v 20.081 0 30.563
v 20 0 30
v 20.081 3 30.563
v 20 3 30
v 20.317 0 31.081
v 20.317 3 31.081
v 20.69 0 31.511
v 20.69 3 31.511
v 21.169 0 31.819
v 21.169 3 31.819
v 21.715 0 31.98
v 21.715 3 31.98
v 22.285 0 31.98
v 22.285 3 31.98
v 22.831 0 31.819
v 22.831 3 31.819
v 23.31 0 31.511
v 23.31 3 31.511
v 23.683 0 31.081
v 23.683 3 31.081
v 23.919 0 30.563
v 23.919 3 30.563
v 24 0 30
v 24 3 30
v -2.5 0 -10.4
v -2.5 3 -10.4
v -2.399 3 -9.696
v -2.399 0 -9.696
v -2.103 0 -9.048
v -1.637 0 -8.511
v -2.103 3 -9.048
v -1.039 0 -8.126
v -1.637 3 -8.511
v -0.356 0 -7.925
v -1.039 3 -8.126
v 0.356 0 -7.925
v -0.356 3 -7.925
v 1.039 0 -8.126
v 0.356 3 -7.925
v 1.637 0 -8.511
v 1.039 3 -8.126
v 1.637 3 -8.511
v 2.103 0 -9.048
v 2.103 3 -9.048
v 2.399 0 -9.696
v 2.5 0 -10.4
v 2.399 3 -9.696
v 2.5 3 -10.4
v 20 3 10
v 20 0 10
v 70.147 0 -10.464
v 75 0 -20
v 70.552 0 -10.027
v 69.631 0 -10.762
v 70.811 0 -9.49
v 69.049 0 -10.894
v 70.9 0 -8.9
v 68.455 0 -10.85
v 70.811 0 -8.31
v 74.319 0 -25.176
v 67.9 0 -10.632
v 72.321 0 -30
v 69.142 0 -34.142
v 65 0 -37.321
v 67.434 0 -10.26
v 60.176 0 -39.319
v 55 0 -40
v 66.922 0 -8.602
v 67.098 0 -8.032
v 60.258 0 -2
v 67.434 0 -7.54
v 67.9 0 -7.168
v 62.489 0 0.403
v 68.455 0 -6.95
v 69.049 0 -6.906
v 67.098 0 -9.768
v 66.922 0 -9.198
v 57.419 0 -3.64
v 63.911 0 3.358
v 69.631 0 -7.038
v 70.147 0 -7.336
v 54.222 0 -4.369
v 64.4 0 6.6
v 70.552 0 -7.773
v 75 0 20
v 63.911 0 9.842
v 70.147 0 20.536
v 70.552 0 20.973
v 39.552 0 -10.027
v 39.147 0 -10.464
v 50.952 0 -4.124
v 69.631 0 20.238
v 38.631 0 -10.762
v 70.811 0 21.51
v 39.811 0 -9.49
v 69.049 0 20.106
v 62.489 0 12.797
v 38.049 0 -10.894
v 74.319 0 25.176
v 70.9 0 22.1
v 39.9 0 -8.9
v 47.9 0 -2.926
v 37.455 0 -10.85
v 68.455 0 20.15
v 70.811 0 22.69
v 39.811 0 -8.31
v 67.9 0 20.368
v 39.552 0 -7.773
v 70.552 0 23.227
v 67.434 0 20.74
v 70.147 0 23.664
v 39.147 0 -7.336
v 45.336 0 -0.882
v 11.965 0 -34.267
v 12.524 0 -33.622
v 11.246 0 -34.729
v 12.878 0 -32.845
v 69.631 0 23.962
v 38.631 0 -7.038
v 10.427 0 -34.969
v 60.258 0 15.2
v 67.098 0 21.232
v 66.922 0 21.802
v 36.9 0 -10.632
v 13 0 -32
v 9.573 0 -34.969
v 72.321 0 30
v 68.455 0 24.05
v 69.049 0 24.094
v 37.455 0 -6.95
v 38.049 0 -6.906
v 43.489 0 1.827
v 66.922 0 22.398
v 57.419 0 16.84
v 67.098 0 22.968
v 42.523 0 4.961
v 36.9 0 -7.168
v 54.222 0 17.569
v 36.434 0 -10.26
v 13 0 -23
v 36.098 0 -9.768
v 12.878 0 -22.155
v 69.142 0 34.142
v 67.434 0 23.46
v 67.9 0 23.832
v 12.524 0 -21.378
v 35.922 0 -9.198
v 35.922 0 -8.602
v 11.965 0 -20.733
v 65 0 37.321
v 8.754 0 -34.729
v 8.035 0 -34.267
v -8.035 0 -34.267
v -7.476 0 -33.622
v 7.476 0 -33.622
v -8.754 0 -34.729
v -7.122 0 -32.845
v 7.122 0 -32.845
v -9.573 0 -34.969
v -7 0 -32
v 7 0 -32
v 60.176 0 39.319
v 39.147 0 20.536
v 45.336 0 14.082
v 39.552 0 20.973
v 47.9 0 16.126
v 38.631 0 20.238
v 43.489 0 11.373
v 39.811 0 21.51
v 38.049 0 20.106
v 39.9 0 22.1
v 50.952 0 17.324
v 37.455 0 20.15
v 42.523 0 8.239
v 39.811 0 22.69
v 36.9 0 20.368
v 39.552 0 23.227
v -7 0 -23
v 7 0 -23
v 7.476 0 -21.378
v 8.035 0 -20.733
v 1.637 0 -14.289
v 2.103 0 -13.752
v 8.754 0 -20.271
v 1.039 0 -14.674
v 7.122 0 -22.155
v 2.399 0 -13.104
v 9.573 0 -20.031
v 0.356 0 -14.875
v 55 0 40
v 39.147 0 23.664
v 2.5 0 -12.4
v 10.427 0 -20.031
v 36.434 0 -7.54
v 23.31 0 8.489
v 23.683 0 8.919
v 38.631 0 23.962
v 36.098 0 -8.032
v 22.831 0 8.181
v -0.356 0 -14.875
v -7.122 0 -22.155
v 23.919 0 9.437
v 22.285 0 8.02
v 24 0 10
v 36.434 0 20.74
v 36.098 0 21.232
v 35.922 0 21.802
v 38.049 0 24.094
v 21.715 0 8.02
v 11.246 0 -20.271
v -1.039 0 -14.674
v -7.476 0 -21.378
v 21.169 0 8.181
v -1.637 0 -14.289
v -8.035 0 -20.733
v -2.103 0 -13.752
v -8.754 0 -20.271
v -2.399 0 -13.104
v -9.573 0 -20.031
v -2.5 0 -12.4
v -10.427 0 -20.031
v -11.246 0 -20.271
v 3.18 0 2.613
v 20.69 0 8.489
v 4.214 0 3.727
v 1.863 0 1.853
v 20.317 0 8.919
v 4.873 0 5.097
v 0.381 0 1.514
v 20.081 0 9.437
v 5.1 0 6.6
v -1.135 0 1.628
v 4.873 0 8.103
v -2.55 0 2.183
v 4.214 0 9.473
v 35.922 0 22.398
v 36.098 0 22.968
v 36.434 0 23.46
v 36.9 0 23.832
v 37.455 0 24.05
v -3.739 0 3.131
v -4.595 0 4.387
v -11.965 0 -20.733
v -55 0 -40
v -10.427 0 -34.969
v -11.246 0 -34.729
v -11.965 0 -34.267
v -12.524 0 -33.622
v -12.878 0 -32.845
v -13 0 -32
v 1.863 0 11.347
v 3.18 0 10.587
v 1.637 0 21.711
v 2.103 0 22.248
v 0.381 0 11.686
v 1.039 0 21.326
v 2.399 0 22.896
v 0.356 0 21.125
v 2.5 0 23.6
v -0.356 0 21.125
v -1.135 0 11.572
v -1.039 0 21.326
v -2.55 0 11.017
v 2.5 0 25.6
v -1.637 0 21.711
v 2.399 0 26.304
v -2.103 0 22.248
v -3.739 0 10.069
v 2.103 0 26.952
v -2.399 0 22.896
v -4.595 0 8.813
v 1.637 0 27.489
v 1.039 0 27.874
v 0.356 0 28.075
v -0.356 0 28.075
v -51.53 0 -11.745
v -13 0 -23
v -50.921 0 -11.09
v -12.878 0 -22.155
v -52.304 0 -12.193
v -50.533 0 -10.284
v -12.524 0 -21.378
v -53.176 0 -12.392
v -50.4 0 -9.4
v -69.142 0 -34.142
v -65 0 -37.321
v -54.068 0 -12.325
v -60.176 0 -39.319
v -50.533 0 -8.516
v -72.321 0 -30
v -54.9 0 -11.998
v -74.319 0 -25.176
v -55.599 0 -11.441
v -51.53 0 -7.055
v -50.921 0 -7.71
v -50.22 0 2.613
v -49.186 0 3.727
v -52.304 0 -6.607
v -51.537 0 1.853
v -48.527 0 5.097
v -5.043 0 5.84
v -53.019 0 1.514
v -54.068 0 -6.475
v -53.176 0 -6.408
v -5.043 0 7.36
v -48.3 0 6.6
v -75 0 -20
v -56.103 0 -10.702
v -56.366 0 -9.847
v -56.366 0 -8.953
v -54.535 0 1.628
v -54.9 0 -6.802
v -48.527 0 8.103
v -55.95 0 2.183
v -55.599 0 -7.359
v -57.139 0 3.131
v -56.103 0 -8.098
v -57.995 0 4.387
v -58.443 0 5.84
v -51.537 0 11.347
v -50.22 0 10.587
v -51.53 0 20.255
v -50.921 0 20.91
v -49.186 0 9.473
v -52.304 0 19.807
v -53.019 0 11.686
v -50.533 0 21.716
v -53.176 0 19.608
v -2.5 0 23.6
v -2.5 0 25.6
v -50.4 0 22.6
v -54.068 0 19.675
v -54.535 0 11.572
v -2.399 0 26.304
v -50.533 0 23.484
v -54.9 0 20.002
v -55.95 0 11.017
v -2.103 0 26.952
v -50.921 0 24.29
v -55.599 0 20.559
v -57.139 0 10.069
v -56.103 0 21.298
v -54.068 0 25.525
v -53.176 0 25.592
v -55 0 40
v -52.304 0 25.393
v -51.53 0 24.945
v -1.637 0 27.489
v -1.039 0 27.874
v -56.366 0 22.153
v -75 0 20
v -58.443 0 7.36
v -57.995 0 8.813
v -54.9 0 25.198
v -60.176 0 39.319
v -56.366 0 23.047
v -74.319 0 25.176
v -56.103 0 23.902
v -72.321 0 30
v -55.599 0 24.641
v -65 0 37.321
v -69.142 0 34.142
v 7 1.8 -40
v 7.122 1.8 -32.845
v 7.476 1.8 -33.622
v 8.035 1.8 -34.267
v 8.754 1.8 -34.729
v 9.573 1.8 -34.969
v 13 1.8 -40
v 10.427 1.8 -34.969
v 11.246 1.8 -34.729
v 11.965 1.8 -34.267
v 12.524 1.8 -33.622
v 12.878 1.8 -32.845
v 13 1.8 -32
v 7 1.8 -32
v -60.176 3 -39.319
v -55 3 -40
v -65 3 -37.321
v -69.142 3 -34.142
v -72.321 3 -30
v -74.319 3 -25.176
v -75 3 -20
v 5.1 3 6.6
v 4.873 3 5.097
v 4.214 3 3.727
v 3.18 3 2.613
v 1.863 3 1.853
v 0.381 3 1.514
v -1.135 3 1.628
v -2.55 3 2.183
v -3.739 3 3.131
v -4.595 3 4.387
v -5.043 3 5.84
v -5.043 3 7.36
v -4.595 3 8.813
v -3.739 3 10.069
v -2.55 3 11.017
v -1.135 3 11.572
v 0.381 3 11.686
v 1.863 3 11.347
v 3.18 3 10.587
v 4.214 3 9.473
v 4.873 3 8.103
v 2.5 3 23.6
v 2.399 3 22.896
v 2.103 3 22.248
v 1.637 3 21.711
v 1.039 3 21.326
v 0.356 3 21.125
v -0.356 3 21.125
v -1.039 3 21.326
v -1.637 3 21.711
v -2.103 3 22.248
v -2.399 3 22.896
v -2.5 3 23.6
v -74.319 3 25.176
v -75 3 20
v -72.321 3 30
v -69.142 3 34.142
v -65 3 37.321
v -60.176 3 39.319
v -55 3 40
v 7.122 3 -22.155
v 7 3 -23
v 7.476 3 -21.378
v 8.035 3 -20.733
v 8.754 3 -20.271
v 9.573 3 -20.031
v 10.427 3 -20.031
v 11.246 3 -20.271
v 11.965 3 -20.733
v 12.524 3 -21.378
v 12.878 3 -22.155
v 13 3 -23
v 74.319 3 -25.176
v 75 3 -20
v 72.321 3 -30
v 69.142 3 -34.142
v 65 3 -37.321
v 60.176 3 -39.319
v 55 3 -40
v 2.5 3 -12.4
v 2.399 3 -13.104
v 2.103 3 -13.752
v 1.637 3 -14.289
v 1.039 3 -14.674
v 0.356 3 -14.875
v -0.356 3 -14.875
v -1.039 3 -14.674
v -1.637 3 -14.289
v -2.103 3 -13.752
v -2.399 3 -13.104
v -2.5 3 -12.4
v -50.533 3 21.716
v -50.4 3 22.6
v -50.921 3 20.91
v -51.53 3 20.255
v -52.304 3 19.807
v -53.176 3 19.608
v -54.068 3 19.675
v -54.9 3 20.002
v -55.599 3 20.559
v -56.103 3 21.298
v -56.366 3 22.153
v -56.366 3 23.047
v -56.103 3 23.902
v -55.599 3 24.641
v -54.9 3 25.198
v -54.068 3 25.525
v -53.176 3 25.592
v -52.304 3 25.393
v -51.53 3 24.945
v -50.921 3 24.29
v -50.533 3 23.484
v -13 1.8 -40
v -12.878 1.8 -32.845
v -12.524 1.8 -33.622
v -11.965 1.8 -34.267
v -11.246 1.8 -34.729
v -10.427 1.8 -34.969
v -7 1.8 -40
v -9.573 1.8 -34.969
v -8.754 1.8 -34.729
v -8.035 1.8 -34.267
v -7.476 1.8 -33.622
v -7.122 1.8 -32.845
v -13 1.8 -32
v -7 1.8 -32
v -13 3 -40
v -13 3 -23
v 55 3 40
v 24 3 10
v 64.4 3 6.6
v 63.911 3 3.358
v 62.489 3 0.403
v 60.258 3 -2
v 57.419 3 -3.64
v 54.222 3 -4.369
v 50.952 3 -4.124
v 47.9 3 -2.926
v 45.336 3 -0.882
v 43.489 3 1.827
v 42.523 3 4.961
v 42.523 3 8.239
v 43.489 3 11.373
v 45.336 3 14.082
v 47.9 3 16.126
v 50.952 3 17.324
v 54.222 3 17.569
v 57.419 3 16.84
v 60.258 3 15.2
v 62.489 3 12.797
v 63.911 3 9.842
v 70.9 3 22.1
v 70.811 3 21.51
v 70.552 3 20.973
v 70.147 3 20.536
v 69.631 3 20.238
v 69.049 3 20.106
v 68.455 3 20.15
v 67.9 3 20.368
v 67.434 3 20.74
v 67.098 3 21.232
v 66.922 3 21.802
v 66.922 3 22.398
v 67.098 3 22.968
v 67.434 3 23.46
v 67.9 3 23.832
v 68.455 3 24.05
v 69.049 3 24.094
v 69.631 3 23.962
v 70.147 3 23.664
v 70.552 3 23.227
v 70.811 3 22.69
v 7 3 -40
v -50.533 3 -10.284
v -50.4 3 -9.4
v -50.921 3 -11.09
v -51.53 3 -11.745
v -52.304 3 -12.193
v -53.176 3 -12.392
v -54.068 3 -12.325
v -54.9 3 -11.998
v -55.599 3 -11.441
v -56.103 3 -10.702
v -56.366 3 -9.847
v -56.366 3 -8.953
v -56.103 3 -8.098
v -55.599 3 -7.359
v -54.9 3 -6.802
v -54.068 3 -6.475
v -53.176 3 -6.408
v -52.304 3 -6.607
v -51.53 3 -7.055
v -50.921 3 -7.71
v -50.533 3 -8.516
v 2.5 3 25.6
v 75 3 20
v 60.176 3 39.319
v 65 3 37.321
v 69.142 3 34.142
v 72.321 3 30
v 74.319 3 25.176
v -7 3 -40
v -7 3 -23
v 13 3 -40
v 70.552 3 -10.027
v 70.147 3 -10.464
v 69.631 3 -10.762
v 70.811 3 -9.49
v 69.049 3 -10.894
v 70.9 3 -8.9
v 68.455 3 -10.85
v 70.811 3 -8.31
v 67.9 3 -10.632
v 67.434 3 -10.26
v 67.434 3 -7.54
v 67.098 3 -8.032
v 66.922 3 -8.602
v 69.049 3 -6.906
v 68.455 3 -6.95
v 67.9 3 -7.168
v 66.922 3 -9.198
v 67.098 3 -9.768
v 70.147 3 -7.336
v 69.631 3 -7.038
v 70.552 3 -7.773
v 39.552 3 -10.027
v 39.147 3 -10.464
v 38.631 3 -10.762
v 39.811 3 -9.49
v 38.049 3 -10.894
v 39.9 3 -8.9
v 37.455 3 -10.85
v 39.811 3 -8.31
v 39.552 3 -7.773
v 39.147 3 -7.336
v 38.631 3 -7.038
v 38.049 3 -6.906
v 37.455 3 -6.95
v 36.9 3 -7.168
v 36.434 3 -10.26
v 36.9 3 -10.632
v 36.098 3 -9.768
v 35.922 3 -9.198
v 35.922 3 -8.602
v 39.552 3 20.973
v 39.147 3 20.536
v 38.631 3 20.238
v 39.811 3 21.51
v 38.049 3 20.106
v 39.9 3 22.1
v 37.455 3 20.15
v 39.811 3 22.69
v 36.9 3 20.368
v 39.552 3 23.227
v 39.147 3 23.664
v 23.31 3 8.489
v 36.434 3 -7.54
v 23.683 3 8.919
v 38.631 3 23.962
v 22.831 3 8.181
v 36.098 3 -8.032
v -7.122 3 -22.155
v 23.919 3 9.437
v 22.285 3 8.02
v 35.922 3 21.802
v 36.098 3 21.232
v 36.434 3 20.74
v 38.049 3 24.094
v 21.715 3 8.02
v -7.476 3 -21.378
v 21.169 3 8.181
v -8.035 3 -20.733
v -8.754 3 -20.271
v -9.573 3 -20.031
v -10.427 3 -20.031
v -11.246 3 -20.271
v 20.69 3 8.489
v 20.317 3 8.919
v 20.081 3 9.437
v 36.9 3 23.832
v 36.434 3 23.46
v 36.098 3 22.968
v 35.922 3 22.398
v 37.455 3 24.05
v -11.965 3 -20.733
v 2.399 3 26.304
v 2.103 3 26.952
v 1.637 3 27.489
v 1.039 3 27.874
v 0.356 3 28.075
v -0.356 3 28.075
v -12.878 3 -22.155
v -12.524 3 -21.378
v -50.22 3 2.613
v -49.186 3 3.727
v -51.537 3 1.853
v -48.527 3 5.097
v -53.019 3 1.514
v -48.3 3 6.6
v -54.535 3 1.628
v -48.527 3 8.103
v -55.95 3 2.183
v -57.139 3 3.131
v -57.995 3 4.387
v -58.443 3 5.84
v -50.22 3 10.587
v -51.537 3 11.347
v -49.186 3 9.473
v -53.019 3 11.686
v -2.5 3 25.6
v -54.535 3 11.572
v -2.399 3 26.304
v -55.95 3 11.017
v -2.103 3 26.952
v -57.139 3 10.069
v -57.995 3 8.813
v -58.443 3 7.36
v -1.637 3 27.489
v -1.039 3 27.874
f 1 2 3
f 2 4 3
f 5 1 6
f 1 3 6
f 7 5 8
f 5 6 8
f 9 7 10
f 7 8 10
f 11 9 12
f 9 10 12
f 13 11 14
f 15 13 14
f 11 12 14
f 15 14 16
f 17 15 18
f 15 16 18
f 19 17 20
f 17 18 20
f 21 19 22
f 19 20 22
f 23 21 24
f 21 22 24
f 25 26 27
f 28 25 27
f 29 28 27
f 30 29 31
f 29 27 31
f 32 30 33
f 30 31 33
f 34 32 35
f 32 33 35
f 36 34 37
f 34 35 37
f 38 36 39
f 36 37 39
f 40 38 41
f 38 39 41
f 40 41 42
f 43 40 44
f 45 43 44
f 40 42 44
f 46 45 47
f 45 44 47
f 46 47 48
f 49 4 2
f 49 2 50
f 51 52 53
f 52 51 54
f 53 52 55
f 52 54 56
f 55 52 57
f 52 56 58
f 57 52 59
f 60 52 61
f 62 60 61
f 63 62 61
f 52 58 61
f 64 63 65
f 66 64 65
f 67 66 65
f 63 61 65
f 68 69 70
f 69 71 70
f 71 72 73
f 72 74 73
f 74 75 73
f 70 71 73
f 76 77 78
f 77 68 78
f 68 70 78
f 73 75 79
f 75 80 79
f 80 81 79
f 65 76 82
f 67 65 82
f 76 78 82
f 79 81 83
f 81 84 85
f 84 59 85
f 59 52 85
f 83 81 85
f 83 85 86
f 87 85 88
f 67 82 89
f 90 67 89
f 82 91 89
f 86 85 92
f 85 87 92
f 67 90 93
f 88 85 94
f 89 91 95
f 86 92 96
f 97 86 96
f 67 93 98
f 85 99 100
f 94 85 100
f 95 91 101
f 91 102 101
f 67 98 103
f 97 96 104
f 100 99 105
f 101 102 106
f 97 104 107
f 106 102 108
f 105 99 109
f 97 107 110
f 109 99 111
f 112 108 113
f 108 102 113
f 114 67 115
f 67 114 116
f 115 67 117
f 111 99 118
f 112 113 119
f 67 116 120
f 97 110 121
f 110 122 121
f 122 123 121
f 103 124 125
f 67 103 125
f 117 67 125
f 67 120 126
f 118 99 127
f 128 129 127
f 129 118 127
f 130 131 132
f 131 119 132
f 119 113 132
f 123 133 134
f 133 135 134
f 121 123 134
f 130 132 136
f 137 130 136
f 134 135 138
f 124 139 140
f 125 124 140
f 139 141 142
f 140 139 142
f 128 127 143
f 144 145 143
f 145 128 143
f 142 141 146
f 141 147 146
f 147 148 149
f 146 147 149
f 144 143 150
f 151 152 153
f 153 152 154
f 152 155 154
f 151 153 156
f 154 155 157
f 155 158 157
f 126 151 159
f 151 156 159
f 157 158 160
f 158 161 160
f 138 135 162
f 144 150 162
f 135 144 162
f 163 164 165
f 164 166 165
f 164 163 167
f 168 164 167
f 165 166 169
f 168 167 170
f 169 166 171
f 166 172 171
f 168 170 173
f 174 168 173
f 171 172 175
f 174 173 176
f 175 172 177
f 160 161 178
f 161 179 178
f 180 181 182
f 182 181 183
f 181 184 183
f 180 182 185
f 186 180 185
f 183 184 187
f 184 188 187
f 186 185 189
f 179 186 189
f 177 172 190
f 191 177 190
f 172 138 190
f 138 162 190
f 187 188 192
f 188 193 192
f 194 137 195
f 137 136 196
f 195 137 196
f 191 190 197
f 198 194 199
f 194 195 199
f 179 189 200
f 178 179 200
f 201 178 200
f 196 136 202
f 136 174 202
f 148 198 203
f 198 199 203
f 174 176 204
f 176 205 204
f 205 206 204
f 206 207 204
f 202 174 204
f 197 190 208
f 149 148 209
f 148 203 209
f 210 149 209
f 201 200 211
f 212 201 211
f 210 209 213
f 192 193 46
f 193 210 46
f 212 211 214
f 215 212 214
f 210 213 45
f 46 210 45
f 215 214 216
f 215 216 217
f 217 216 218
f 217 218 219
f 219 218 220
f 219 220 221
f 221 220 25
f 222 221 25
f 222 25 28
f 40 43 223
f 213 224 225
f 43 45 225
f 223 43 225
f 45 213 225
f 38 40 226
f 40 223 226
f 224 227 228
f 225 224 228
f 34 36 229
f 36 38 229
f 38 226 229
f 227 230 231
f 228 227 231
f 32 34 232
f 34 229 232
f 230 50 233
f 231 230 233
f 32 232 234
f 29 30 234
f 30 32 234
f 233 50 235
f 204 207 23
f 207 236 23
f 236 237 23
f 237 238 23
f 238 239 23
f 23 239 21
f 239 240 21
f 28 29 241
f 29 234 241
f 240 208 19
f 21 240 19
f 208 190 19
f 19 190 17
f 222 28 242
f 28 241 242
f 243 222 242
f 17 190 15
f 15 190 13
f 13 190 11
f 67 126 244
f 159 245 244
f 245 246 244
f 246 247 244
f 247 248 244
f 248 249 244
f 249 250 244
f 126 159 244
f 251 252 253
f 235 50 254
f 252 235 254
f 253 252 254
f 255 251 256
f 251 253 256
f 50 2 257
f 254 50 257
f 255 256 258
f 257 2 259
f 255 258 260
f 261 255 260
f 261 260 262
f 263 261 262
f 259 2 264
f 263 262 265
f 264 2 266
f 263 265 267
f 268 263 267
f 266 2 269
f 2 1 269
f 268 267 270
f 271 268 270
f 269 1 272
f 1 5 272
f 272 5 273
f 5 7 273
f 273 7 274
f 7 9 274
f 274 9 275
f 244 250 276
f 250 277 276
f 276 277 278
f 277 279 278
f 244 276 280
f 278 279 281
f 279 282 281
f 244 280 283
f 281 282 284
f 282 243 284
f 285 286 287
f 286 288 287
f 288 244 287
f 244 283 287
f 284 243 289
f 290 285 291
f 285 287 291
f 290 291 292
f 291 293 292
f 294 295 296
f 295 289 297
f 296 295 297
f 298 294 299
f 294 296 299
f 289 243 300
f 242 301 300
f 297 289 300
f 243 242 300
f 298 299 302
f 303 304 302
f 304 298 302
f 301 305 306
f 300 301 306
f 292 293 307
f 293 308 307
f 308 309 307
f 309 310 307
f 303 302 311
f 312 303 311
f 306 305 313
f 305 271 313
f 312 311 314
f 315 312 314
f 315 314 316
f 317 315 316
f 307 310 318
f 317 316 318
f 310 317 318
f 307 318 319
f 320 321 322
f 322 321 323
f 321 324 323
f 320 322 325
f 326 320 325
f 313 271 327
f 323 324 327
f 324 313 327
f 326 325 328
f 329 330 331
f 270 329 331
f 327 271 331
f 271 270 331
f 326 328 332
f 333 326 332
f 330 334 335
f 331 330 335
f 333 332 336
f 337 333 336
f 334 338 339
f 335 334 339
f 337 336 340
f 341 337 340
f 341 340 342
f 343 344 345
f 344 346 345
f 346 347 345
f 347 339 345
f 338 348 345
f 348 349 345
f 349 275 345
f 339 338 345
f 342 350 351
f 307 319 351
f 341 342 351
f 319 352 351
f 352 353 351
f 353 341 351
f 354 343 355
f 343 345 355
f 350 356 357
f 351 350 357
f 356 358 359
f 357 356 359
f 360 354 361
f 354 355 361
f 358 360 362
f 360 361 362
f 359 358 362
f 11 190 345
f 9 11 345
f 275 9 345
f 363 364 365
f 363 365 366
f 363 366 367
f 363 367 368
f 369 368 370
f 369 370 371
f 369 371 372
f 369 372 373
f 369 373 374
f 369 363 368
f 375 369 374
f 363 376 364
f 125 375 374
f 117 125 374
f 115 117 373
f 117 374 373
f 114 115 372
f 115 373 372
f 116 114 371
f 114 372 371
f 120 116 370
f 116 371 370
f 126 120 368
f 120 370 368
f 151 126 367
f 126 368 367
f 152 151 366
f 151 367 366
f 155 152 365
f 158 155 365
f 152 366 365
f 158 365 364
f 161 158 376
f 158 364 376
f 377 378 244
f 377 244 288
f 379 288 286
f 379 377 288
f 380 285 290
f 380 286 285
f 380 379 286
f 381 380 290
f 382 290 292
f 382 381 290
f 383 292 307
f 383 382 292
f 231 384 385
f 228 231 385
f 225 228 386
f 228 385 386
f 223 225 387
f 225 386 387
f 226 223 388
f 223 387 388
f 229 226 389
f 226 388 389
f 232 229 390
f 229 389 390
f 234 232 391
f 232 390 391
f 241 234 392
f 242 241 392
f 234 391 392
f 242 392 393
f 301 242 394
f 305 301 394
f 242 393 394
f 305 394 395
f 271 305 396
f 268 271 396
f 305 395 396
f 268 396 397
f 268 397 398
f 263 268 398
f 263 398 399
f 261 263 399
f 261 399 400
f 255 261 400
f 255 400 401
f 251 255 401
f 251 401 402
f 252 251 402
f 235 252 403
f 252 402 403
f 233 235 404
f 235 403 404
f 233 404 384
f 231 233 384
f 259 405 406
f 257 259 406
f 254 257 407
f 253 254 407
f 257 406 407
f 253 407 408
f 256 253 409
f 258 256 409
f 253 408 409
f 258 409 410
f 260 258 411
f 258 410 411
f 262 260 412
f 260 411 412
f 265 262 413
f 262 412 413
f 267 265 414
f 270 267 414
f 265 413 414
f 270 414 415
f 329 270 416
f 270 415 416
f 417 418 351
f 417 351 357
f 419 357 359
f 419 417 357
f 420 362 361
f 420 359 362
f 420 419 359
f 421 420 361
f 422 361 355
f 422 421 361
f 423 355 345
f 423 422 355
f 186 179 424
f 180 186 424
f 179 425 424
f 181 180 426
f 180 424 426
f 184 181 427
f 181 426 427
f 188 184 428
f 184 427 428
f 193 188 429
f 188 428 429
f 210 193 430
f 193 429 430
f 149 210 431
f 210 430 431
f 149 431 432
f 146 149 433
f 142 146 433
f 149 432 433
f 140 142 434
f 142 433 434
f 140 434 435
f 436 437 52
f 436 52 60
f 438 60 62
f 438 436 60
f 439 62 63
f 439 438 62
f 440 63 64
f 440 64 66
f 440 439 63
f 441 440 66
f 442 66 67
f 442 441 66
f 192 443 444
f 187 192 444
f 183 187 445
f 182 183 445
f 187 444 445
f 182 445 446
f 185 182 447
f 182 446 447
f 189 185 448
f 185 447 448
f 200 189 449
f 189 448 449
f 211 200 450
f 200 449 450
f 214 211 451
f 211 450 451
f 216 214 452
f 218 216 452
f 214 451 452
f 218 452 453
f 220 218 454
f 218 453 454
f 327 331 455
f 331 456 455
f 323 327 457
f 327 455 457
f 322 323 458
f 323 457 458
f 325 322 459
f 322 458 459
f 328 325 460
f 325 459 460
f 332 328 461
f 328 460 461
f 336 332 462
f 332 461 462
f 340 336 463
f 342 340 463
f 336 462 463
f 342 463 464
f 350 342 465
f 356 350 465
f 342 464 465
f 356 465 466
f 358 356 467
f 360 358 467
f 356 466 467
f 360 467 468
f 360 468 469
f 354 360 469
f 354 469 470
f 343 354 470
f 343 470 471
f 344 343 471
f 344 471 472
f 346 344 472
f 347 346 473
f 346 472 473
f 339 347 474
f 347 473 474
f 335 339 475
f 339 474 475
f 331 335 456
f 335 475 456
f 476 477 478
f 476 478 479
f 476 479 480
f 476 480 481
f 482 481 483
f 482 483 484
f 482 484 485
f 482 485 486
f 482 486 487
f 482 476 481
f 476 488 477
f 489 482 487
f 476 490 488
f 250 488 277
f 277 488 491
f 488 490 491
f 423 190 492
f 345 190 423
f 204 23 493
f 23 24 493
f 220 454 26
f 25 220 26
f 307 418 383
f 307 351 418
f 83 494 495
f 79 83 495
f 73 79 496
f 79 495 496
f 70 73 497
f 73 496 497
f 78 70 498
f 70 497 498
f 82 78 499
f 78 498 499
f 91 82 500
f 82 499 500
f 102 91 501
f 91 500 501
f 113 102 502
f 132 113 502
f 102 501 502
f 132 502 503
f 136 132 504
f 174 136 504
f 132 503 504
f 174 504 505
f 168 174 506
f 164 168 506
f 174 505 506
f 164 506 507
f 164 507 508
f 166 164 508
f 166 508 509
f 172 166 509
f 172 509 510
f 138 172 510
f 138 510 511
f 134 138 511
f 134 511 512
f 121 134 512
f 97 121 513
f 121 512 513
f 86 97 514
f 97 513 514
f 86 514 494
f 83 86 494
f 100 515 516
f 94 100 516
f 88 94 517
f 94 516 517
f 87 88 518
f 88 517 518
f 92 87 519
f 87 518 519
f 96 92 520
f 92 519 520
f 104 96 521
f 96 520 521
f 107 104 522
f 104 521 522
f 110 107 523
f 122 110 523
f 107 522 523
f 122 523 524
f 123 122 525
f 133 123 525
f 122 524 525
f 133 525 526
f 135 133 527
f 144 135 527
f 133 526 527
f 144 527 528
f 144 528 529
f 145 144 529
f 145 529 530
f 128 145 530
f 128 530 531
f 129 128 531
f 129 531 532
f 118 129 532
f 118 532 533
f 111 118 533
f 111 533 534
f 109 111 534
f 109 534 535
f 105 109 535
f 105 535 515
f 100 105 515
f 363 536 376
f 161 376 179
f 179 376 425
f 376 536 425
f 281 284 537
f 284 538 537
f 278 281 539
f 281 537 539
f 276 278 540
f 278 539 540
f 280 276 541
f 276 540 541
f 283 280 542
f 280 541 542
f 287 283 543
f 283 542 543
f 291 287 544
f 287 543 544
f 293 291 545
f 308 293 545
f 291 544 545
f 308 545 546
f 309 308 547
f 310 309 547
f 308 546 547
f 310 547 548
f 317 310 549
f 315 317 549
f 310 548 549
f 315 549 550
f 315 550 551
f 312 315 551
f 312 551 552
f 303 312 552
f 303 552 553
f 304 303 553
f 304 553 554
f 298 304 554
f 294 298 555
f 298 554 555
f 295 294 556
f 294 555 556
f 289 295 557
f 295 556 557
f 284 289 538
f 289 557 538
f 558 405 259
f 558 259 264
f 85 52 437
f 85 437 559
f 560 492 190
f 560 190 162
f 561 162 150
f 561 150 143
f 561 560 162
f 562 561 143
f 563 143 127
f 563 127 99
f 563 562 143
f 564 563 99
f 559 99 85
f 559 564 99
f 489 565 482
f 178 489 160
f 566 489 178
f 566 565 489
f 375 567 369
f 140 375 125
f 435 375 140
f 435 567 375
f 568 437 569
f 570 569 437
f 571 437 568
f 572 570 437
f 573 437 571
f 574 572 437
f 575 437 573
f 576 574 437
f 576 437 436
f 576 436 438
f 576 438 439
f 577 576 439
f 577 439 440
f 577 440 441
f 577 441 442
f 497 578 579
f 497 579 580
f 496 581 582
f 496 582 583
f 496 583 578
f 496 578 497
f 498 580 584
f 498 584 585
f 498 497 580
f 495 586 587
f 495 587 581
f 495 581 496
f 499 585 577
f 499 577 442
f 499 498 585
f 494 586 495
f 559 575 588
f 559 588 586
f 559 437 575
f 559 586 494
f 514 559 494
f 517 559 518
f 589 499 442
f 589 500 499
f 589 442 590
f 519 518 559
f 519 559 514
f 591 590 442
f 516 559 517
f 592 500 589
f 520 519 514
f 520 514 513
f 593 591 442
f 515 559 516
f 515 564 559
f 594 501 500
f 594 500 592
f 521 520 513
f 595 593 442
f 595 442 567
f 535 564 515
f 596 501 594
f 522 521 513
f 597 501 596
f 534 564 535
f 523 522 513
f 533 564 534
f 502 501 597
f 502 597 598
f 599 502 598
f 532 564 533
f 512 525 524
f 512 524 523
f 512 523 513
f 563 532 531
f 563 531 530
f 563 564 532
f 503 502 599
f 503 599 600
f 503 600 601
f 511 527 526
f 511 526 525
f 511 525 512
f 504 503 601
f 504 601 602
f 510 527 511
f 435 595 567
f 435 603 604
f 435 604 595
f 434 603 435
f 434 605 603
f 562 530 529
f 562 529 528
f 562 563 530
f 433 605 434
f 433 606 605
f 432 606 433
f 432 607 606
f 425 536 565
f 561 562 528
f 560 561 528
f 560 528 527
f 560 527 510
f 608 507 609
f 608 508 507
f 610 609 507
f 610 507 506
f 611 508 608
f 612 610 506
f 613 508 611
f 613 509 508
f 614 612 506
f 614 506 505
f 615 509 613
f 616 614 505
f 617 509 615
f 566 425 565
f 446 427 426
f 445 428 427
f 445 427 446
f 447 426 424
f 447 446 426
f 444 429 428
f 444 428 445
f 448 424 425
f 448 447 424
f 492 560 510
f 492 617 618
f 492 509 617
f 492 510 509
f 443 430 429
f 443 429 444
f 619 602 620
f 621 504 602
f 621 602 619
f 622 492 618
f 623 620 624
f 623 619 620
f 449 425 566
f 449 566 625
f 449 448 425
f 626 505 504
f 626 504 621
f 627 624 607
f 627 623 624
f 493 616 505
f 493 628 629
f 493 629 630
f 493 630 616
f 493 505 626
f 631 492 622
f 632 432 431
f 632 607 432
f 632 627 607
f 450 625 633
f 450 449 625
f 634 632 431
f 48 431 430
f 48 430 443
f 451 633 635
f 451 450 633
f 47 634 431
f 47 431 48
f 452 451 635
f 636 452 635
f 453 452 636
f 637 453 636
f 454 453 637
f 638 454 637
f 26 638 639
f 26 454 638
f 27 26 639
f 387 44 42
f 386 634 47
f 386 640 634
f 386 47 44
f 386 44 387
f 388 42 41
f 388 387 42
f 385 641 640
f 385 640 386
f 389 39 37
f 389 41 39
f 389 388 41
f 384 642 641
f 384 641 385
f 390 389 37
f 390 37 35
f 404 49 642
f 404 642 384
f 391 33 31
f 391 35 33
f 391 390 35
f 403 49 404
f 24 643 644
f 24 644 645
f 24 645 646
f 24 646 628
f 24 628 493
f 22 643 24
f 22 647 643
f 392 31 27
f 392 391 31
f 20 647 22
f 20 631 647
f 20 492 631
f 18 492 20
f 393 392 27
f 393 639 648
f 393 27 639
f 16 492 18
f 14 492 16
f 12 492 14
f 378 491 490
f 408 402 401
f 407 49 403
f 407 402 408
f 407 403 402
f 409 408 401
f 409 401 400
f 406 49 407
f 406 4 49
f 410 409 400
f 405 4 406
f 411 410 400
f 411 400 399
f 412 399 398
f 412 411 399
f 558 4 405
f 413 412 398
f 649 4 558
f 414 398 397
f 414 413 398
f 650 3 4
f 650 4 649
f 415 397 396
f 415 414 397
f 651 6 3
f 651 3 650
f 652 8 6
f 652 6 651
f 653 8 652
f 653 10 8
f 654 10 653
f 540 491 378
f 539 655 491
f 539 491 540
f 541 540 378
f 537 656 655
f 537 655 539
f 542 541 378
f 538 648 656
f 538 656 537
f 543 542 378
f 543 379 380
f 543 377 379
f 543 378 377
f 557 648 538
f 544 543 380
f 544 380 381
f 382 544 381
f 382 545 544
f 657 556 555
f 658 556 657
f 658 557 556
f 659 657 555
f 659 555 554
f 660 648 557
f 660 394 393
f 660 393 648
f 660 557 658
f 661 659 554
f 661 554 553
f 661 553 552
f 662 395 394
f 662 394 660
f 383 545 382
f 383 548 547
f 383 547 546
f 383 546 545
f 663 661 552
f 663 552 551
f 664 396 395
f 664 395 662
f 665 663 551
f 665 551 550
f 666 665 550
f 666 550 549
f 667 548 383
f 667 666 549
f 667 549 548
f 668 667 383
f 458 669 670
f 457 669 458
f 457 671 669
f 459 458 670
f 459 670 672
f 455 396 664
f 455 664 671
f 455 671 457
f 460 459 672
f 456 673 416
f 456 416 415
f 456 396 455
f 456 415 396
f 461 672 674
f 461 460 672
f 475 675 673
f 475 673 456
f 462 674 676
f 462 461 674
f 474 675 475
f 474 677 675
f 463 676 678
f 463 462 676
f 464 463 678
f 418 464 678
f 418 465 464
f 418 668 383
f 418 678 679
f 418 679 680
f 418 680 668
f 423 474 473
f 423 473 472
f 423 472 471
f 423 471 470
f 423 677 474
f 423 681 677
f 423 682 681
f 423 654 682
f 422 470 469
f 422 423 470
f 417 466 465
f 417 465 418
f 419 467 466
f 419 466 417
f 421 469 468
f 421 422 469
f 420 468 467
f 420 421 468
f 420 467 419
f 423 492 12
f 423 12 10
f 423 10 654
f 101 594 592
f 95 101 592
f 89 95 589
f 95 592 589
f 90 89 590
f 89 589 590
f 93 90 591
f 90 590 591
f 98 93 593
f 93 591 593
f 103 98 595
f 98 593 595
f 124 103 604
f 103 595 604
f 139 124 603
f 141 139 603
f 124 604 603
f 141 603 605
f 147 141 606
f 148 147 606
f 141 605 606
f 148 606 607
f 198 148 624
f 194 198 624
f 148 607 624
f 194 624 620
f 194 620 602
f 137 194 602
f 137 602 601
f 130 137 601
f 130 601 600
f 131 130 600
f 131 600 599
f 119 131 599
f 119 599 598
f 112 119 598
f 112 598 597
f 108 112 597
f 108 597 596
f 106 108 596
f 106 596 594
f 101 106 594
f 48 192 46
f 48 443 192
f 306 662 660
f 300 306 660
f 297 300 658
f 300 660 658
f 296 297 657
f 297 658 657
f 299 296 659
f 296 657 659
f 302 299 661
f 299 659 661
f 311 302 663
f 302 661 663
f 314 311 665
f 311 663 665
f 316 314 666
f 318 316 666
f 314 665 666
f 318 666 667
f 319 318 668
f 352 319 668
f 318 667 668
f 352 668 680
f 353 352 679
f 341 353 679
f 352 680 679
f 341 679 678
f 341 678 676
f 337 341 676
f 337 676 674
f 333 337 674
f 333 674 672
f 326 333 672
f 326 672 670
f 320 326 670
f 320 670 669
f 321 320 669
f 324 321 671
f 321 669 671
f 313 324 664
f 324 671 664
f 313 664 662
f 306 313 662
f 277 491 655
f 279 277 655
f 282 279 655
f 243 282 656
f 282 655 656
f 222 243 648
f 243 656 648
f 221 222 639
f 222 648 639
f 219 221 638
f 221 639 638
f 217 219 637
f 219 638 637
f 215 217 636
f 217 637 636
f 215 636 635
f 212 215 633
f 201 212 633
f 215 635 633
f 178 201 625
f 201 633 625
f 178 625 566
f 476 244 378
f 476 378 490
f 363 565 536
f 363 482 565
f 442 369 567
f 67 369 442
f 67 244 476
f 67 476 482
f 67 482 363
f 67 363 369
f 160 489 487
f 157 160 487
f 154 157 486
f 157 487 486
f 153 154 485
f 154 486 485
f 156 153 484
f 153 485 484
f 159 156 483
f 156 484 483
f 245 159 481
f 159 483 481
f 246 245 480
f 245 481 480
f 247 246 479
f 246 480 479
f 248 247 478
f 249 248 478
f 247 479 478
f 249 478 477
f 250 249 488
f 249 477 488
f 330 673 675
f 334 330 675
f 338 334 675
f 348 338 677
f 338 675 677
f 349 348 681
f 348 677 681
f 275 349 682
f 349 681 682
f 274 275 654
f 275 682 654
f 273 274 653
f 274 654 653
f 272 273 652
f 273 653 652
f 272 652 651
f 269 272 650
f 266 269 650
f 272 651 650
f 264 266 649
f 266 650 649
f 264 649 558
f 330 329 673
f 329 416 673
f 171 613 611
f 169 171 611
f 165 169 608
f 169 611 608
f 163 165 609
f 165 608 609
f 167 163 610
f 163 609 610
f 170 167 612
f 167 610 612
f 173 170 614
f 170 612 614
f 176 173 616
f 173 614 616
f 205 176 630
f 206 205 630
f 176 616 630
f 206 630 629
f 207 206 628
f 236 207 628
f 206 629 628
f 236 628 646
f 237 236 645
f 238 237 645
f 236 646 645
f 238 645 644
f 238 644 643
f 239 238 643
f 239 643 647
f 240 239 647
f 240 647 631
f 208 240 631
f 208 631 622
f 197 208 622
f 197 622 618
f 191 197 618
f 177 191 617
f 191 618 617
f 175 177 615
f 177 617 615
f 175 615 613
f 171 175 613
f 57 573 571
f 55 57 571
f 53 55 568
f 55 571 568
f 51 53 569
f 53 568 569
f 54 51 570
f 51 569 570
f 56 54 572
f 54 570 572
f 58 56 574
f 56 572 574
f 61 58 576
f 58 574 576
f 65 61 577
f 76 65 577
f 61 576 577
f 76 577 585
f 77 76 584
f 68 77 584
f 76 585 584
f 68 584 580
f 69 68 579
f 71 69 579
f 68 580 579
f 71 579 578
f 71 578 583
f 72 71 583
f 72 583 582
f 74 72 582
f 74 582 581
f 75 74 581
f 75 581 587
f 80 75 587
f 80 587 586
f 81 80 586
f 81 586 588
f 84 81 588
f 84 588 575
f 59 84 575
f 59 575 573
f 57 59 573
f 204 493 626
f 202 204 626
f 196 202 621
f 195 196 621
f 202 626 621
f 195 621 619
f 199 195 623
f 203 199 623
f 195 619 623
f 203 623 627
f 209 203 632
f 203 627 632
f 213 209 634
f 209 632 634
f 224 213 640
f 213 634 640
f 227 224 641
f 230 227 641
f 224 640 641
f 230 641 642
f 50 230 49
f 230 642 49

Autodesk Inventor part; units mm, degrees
ref_plane "YZ Plane" through (0, 0, 0) normal (1, 0, 0) x (0, 1, 0)
ref_plane "XZ Plane" through (0, 0, 0) normal (0, 1, 0) x (-1, 0, 0)
ref_plane "XY Plane" through (0, 0, 0) normal (0, 0, 1) x (1, 0, 0)
sketch "Sketch1" plane through (0, 0, 0) normal (0, 1, 0) x (-1, 0, 0)
  line L0 (-75, 40) -> (75, 40)
  line L1 (75, 40) -> (75, -40)
  line L2 (75, -40) -> (-75, -40)
  line L3 (-75, -40) -> (-75, 40)
  line L4 (-75, 40) -> (75, -40) construction
  line L5 (75, 40) -> (-75, -40) construction
  point P0 (0, 0)
  dimension "d0" = 150
  dimension "d1" = 80
extrude "Extrusion1" add sketch "Sketch1" along normal blind 3
sketch "Sketch4" plane through (0, 3, 0) normal (0, 1, 0) x (1, 0, 0)
  line L0 (75, 40) -> (-75, 40) projected
  line L1 (-10, 40) -> (10, 40)
  line L2 (10, 40) -> (10, 20)
  line L3 (-10, 40) -> (-10, 20)
  line L4 (-10, 20) -> (10, 20)
  line L5 (-13, 40) -> (-7, 40)
  line L6 (7, 40) -> (13, 40)
  line L7 (-10, 40) -> (-10, 35)
  line L8 (10, 40) -> (10, 35)
  line L9 (-10, 35) -> (-10, 32)
  line L10 (10, 35) -> (10, 32)
  line L11 (-10, 20) -> (-10, 23)
  line L12 (10, 20) -> (10, 23)
  circle A0 centre (-10, 23) radius 3
  circle A1 centre (10, 23) radius 3
  circle A2 centre (-10, 32) radius 3
  circle A3 centre (10, 32) radius 3
  line L13 (-13, 32) -> (-13, 23)
  line L14 (-7, 32) -> (-7, 23)
  line L15 (7, 32) -> (7, 23)
  line L16 (13, 32) -> (13, 23)
  line L17 (-10, 20) -> (-7, 20)
  line L18 (-7, 20) -> (-7, 40)
  line L19 (-7, 40) -> (-10, 40)
  line L20 (-10, 40) -> (-10, 20)
  line L21 (-10, 40) -> (-13, 40)
  line L22 (-13, 40) -> (-13, 20)
  line L23 (-13, 20) -> (-10, 20)
  line L24 (-10, 20) -> (-10, 40)
  line L25 (10, 20) -> (7, 20)
  line L26 (7, 20) -> (7, 40)
  line L27 (7, 40) -> (10, 40)
  line L28 (10, 40) -> (10, 20)
  line L29 (10, 20) -> (13, 20)
  line L30 (13, 20) -> (13, 40)
  line L31 (13, 40) -> (10, 40)
  line L32 (10, 40) -> (10, 20)
  point P0 (0, 0)
  point P1 (0, 40)
  point P2 (7, 40)
  point P3 (7, 32)
  point P4 (-7, 40)
  point P5 (-13, 40)
  dimension "d14" = 20
  dimension "d15" = 20
  dimension "d16" = 6
  dimension "d17" = 6
  dimension "d18" = 5
  dimension "d19" = 5
  dimension "d20" = 3
  dimension "d21" = 3
  dimension "d22" = 3
  dimension "d23" = 3
extrude "Extrusion3" cut sketch "Sketch4" against normal through all contours A3 L2 | L16 A1 L2 A3 | L2 A3 | L2 A1 L15 A3 | A1 L2 | L2 A1 | A2 L3 | L14 A0 L3 A2 | L3 A2 | L3 A0 L13 A2 | A0 L3 | L3 A0
sketch "Sketch5" plane through (0, 3, 0) normal (0, 1, 0) x (1, 0, 0)
  line L0 (-75, 40) -> (-75, -40) projected
  line L1 (75, 40) -> (-75, 40)
  line L2 (-75, 40) -> (-75, 15)
  line L3 (-75, 15) -> (75, 15)
  line L4 (75, 15) -> (75, 40)
  line L5 (21.6, 15) -> (-21.6, 15)
  line L6 (75, 15) -> (31.8, 15)
  line L7 (31.8, 15) -> (31.8, -28.2)
  line L8 (31.8, -28.2) -> (75, -28.2)
  line L9 (75, -28.2) -> (75, 15)
  line L10 (31.8, 15) -> (75, -28.2)
  line L11 (75, 15) -> (31.8, -28.2)
  circle A0 centre (53.4, -6.6) radius 11
  line L12 (37.9, -22.1) -> (68.9, -22.1)
  line L13 (68.9, -22.1) -> (68.9, 8.9)
  line L14 (68.9, 8.9) -> (37.9, 8.9)
  line L15 (37.9, 8.9) -> (37.9, -22.1)
  line L16 (37.9, -22.1) -> (68.9, 8.9) construction
  line L17 (68.9, -22.1) -> (37.9, 8.9) construction
  circle A1 centre (37.9, 8.9) radius 2
  circle A2 centre (68.9, 8.9) radius 2
  circle A3 centre (68.9, -22.1) radius 2
  circle A4 centre (37.9, -22.1) radius 2
  point P0 (309.988, -32.2194)
  dimension "d26" = 25
  dimension "d49" = 150
  dimension "d50" = 43.2
  dimension "d51" = 43.2
  dimension "d52" = 22
  dimension "d53" = 31
  dimension "d54" = 31
  dimension "d55" = 4
  dimension "d56" = 4
  dimension "d57" = 4
  dimension "d58" = 4
extrude "Extrusion4" cut sketch "Sketch5" against normal through all contours A2 L13 L11 | L11 L14 A2 | A1 L14 L10 | L10 L15 A1 | A3 L12 L10 | L10 L13 A3 | L13 A2 L11 | L11 A2 L14 | A4 L15 L11 | L11 L12 A4 | L14 A1 L10 | L10 A1 L15 | L12 A3 L10 | L10 A3 L13 | L15 A4 L11 | L11 A4 L12 | A0 L10 L11 | L11 L10 A0 | L10 L11 A0 | A0 L11 L10
extrude "Extrusion5" cut sketch "Sketch4" against normal blind 1.2 contours L30 A3 L2 L0 | L2 A3 L26 L0 | L18 A2 L3 L0 | L3 A2 L22 L0
sketch "Sketch6" plane through (0, 3, 0) normal (0, 1, 0) x (1, 0, 0)
  line L0 (75, 40) -> (-75, 40) projected
  line L1 (0, 40) -> (0, 15)
  line L2 (0, 15) -> (0, -28.2)
  line L3 (-21.6, 15) -> (21.6, 15)
  line L4 (21.6, 15) -> (21.6, -28.2)
  line L5 (21.6, -28.2) -> (-21.6, -28.2)
  line L6 (-21.6, -28.2) -> (-21.6, 15)
  line L7 (-21.6, 15) -> (21.6, -28.2) construction
  line L8 (21.6, 15) -> (-21.6, -28.2) construction
  circle A0 centre (0, -6.6) radius 5.1
  line L9 (0, 15) -> (75, 15)
  line L10 (75, 15) -> (31.8, 15)
  line L11 (31.8, 15) -> (31.8, -6.6)
  line L12 (31.8, -6.6) -> (53.4, -6.6)
  line L13 (53.4, -6.6) -> (0, -6.6)
  line L14 (0, -6.6) -> (-53.4, -6.6)
  circle A1 centre (-53.4, -6.6) radius 5.1
  line L15 (0, -25.6) -> (0, 12.4)
  circle A2 centre (0, 12.4) radius 2.5
  line L16 (0, 12.4) -> (0, 10.4)
  circle A3 centre (0, 10.4) radius 2.5
  circle A4 centre (0, -25.6) radius 2.5
  line L17 (0, -25.6) -> (0, -23.6)
  circle A5 centre (0, -23.6) radius 2.5
  line L18 (-2.5, -23.6) -> (-2.5, -25.6)
  line L19 (2.5, -23.6) -> (2.5, -25.6)
  line L20 (-2.5, 12.4) -> (-2.5, 10.4)
  line L21 (2.5, 12.4) -> (2.5, 10.4)
  line L22 (-53.4, 9.4) -> (-53.4, -22.6)
  circle A6 centre (-53.4, -22.6) radius 3
  circle A7 centre (-53.4, 9.4) radius 3
  point P0 (0, 0)
  dimension "d59" = 25
  dimension "d60" = 43.2
  dimension "d61" = 43.2
  dimension "d62" = 43.2
  dimension "d63" = 10.2
  dimension "d64" = 43.2
  dimension "d65" = 53.4
  dimension "d66" = 10.2
  dimension "d69" = 38
  dimension "d70" = 5
  dimension "d71" = 2
  dimension "d72" = 5
  dimension "d73" = 5
  dimension "d74" = 2
  dimension "d75" = 5
  dimension "d84" = 32
  dimension "d85" = 6
  dimension "d86" = 6
extrude "Extrusion6" cut sketch "Sketch6" against normal through all contours L2 A3 A2 | L2 A2 A3 | A3 A2 L2 | L2 A2 A3 | A2 A3 L2 | L2 A3 A2 | A2 L21 A3 | A3 L20 A2 | A6 | A7 | A1 L22 L14 | L14 L22 A1 | A0 L13 L2 | L2 L14 A0 | L13 A0 L2 | L2 A0 L14 | A5 A4 L2 | L2 A4 A5 | L22 A1 | A4 A5 L2 | L2 A5 A4 | L19 A4 A5 | A5 A4 L18 | A4 A5 L2 | L2 A5 A4
fillet "Fillet1" radius 20 4 edges at (75, 1.5, 40) (75, 1.5, -40) (-75, 1.5, 40) (-75, 1.5, -40)
sketch "Sketch7" plane through (0, 3, 0) normal (0, 1, 0) x (1, 0, 0)
  line L0 (0, 0) -> (22, 0)
  line L1 (22, 0) -> (22, -30)
  circle A0 centre (22, -30) radius 2
  line L2 (20, -30) -> (24, -30)
  line L3 (20, -30) -> (20, 0)
  line L4 (24, -30) -> (24, 0)
  line L5 (22, -30) -> (22, -10)
  circle A1 centre (22, -10) radius 2
  point P0 (24, -10)
  point P1 (20, -10)
  dimension "d90" = 4
  dimension "d88" = 22
  dimension "d89" = 30
  dimension "d91" = 20
extrude "Extrusion7" cut sketch "Sketch7" against normal through all contours A1 L1 A0 L3 | A1 L1 | A1 L1 | L2 A0 | A0 L1 L2 | A1 L4 A0 L1 | L2 L1 A0
properties part number "TopMount"
